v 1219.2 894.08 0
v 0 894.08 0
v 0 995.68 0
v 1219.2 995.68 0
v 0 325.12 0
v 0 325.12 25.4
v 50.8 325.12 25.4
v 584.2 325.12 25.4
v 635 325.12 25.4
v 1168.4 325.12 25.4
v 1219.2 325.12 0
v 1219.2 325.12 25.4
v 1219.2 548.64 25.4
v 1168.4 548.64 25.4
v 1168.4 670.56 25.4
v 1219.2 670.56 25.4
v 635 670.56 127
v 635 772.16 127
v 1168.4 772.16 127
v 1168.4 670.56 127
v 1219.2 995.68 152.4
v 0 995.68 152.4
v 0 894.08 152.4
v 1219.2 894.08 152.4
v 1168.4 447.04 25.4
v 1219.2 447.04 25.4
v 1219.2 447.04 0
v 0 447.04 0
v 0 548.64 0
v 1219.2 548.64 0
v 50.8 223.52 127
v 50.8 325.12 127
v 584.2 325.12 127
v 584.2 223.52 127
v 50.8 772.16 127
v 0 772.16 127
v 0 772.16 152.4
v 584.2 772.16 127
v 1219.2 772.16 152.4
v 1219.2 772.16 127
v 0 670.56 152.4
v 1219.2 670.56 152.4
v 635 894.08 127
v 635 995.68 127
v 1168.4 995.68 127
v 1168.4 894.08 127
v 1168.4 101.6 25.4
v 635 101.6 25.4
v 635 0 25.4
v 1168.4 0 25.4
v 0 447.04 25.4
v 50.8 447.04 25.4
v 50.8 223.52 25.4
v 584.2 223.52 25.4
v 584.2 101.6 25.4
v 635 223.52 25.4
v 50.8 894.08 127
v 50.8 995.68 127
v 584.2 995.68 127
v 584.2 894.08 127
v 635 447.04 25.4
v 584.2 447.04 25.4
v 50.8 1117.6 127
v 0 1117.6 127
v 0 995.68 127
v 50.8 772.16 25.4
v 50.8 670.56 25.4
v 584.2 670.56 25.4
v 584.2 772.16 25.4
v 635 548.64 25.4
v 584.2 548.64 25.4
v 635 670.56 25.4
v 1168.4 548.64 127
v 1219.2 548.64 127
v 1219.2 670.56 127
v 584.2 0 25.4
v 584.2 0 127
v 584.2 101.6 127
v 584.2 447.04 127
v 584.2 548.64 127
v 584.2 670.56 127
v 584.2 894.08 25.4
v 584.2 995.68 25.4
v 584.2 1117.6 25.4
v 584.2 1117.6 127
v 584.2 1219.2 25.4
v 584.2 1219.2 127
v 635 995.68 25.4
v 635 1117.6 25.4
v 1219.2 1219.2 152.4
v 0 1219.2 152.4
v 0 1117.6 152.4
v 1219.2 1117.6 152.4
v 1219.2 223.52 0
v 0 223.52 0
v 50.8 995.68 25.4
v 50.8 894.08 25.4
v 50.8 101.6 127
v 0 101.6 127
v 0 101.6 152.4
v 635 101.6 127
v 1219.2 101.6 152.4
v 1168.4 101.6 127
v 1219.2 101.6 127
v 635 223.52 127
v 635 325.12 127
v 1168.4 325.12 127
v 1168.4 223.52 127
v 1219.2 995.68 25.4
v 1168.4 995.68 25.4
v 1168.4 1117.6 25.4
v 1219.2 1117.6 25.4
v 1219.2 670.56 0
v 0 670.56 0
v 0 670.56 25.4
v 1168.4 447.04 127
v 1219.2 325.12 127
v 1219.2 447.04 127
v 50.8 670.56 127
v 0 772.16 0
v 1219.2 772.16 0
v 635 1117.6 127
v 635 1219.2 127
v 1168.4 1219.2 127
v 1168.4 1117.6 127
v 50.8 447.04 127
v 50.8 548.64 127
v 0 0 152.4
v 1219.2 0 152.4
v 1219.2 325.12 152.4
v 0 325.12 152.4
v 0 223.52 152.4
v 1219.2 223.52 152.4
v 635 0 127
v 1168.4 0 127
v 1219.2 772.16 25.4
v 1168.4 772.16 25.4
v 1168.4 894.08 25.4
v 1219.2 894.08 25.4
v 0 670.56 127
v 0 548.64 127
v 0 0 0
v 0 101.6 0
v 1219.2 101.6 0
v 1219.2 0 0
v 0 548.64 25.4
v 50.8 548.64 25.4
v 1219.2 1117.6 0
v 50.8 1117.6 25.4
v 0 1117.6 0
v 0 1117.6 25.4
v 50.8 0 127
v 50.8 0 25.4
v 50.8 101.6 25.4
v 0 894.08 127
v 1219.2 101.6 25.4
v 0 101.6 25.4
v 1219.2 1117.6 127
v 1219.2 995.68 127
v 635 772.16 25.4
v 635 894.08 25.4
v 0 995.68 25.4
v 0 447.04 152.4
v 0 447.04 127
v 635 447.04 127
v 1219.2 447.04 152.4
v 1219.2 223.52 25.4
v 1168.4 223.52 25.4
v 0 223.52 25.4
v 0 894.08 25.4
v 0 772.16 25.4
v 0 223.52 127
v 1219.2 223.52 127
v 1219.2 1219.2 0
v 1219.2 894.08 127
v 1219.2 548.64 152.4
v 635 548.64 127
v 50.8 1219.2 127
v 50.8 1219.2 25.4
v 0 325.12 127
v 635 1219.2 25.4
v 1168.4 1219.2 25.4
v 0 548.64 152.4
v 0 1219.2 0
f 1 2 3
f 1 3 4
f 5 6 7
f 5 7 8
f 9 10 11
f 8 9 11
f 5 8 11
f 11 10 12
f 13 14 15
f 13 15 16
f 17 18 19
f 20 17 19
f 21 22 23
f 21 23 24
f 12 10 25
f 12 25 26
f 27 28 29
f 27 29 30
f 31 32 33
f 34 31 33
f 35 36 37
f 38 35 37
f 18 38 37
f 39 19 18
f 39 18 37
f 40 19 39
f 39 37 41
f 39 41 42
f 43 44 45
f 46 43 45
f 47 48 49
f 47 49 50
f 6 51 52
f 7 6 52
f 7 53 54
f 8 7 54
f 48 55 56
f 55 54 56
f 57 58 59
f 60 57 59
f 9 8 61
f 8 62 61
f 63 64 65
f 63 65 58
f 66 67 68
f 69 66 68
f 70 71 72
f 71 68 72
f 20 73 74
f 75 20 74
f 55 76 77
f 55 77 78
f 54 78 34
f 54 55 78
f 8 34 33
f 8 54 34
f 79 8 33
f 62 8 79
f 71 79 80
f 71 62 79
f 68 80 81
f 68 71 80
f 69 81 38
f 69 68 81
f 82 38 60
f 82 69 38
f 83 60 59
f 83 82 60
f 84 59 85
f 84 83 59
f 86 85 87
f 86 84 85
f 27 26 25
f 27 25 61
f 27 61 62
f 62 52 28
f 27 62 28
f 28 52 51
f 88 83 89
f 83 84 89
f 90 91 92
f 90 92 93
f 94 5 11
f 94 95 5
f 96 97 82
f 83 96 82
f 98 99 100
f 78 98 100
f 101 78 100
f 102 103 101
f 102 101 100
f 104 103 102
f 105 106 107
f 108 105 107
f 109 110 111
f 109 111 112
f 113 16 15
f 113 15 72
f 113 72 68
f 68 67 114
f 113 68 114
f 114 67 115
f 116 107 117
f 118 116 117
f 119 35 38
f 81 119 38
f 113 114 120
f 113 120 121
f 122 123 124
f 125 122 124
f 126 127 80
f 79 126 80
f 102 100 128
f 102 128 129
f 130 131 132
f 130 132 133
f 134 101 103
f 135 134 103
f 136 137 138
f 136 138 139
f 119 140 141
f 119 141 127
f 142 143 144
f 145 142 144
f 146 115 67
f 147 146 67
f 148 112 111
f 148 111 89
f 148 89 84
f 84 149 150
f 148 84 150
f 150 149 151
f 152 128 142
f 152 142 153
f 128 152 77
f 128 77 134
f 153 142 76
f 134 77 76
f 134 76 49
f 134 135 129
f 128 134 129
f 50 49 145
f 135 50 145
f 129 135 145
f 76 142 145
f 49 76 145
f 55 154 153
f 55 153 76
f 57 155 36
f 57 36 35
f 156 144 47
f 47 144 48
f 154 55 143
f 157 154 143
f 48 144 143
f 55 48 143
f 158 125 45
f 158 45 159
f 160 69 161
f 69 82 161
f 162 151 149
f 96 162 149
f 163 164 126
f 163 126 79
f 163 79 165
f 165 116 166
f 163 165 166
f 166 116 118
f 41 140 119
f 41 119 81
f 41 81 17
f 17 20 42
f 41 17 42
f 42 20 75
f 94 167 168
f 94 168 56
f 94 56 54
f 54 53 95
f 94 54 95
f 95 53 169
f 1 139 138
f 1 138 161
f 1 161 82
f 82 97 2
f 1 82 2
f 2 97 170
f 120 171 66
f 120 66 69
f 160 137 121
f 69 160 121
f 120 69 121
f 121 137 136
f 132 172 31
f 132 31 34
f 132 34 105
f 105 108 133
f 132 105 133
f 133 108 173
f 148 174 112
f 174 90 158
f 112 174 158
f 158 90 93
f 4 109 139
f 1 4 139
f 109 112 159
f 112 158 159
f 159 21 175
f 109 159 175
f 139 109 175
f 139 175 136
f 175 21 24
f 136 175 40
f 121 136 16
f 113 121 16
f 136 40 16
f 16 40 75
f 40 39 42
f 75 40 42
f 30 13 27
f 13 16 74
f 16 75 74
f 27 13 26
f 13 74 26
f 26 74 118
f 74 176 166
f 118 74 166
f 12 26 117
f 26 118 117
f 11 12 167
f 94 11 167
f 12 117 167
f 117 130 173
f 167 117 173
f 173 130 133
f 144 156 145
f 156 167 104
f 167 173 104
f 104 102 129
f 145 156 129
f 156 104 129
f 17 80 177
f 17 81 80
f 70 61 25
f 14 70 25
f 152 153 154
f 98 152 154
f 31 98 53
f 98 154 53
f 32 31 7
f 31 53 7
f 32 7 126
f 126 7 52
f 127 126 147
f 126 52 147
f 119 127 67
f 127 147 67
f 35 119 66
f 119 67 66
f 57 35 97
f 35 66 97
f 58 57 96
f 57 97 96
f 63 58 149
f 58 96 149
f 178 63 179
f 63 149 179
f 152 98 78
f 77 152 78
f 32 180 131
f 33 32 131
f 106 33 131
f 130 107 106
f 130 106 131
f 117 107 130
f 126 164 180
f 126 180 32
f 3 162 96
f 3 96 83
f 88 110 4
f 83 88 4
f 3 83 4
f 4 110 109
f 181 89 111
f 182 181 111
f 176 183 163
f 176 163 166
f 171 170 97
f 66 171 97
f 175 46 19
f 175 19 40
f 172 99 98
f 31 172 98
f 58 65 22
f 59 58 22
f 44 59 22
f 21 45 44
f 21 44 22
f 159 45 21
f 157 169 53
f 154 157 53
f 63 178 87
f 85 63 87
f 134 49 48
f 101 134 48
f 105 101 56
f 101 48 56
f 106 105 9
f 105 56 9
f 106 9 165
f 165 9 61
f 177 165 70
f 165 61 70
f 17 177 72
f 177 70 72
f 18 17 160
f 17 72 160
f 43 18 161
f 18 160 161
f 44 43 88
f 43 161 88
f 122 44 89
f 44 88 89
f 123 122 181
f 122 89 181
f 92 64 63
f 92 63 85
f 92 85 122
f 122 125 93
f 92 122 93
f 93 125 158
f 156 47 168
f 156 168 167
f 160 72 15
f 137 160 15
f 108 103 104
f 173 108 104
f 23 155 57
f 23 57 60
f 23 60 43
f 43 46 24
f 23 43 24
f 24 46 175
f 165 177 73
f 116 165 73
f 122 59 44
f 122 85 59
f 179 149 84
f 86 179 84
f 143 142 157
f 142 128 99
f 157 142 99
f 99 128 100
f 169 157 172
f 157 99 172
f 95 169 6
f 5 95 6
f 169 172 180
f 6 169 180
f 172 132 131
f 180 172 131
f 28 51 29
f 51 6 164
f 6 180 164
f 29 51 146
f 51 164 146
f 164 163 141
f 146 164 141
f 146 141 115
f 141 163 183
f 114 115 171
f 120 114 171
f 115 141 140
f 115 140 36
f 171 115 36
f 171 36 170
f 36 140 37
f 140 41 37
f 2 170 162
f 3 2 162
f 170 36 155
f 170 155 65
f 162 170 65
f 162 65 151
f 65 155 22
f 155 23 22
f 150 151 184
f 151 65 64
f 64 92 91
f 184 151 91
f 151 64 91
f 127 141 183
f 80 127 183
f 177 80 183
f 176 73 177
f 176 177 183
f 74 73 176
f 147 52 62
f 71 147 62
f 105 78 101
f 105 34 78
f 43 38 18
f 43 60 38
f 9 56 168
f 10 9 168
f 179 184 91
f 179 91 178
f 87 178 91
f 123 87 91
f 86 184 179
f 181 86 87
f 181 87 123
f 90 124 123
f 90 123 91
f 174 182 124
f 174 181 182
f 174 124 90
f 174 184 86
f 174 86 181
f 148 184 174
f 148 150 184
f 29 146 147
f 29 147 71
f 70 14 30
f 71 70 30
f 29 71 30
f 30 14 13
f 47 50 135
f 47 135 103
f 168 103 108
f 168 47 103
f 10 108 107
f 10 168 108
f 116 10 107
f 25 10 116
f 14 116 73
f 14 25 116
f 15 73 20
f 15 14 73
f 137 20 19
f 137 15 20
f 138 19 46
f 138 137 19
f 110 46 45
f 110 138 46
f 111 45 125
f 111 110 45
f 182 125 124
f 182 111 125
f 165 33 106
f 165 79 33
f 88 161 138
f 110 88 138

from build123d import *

# Parameters (mm, degrees)
F1_DEPTH = 25.4
F2_W     = 50.8
F2_H     = 1219.2
F2_W_2   = 25.4
F3_DEPTH = 101.6
F4_W     = 1219.2
F4_H     = 101.6
F5_DEPTH = 25.4
F7_DEPTH = 25.4


with BuildPart() as f1:
    # F0 (on Top) → F1 (new body)
    with BuildSketch(Plane.XY):
        Polygon((0, 101.6), (0, 0), (1219.2, 0), (1219.2, 101.6), (609.6, 101.6), align=None)
    extrude(amount=F1_DEPTH)

    # F2 (on face) → F3 (join)
    with BuildSketch(Plane.XY.offset(25.4)):
        with Locations((25.4, 609.6)):
            Rectangle(F2_W, F2_H)
        with Locations((622.3, 609.6)):
            Rectangle(F2_W_2, F2_H)
        with Locations((596.9, 609.6)):
            Rectangle(F2_W_2, F2_H)
        with Locations((1193.8, 609.6)):
            Rectangle(F2_W, F2_H)
    extrude(amount=F3_DEPTH)

    # F4 (on face) → F5 (join)
    with BuildSketch(Plane.XY.offset(127)):
        with Locations((609.6, 1168.4)):
            Rectangle(F4_W, F4_H)
        with Locations((609.6, 944.88)):
            Rectangle(F4_W, F4_H)
        with Locations((609.6, 721.36)):
            Rectangle(F4_W, F4_H)
        with Locations((609.6, 497.84)):
            Rectangle(F4_W, F4_H)
        with Locations((609.6, 274.32)):
            Rectangle(F4_W, F4_H)
        with Locations((609.6, 50.8)):
            Rectangle(F4_W, F4_H)
    extrude(amount=F5_DEPTH)

    # F6 (on face) → F7 (join)
    with BuildSketch(Plane(origin=(0, 0, 25.4), x_dir=(1, 0, 0), z_dir=(0, 0, -1))):
        Polygon((0, -325.12), (609.6, -325.12), (1219.2, -325.12), (1219.2, -223.52), (609.6, -223.52), (0, -223.52), align=None)
        Polygon((0, -447.04), (0, -548.64), (609.6, -548.64), (1219.2, -548.64), (1219.2, -447.04), (609.6, -447.04), align=None)
        Polygon((0, -670.56), (0, -772.16), (609.6, -772.16), (1219.2, -772.16), (1219.2, -670.56), (609.6, -670.56), align=None)
        Polygon((0, -894.08), (0, -995.68), (609.6, -995.68), (1219.2, -995.68), (1219.2, -894.08), (609.6, -894.08), align=None)
        Polygon((0, -1219.2), (1219.2, -1219.2), (1219.2, -1117.6), (609.6, -1117.6), (0, -1117.6), align=None)
    extrude(amount=F7_DEPTH)


solid = f1.part
